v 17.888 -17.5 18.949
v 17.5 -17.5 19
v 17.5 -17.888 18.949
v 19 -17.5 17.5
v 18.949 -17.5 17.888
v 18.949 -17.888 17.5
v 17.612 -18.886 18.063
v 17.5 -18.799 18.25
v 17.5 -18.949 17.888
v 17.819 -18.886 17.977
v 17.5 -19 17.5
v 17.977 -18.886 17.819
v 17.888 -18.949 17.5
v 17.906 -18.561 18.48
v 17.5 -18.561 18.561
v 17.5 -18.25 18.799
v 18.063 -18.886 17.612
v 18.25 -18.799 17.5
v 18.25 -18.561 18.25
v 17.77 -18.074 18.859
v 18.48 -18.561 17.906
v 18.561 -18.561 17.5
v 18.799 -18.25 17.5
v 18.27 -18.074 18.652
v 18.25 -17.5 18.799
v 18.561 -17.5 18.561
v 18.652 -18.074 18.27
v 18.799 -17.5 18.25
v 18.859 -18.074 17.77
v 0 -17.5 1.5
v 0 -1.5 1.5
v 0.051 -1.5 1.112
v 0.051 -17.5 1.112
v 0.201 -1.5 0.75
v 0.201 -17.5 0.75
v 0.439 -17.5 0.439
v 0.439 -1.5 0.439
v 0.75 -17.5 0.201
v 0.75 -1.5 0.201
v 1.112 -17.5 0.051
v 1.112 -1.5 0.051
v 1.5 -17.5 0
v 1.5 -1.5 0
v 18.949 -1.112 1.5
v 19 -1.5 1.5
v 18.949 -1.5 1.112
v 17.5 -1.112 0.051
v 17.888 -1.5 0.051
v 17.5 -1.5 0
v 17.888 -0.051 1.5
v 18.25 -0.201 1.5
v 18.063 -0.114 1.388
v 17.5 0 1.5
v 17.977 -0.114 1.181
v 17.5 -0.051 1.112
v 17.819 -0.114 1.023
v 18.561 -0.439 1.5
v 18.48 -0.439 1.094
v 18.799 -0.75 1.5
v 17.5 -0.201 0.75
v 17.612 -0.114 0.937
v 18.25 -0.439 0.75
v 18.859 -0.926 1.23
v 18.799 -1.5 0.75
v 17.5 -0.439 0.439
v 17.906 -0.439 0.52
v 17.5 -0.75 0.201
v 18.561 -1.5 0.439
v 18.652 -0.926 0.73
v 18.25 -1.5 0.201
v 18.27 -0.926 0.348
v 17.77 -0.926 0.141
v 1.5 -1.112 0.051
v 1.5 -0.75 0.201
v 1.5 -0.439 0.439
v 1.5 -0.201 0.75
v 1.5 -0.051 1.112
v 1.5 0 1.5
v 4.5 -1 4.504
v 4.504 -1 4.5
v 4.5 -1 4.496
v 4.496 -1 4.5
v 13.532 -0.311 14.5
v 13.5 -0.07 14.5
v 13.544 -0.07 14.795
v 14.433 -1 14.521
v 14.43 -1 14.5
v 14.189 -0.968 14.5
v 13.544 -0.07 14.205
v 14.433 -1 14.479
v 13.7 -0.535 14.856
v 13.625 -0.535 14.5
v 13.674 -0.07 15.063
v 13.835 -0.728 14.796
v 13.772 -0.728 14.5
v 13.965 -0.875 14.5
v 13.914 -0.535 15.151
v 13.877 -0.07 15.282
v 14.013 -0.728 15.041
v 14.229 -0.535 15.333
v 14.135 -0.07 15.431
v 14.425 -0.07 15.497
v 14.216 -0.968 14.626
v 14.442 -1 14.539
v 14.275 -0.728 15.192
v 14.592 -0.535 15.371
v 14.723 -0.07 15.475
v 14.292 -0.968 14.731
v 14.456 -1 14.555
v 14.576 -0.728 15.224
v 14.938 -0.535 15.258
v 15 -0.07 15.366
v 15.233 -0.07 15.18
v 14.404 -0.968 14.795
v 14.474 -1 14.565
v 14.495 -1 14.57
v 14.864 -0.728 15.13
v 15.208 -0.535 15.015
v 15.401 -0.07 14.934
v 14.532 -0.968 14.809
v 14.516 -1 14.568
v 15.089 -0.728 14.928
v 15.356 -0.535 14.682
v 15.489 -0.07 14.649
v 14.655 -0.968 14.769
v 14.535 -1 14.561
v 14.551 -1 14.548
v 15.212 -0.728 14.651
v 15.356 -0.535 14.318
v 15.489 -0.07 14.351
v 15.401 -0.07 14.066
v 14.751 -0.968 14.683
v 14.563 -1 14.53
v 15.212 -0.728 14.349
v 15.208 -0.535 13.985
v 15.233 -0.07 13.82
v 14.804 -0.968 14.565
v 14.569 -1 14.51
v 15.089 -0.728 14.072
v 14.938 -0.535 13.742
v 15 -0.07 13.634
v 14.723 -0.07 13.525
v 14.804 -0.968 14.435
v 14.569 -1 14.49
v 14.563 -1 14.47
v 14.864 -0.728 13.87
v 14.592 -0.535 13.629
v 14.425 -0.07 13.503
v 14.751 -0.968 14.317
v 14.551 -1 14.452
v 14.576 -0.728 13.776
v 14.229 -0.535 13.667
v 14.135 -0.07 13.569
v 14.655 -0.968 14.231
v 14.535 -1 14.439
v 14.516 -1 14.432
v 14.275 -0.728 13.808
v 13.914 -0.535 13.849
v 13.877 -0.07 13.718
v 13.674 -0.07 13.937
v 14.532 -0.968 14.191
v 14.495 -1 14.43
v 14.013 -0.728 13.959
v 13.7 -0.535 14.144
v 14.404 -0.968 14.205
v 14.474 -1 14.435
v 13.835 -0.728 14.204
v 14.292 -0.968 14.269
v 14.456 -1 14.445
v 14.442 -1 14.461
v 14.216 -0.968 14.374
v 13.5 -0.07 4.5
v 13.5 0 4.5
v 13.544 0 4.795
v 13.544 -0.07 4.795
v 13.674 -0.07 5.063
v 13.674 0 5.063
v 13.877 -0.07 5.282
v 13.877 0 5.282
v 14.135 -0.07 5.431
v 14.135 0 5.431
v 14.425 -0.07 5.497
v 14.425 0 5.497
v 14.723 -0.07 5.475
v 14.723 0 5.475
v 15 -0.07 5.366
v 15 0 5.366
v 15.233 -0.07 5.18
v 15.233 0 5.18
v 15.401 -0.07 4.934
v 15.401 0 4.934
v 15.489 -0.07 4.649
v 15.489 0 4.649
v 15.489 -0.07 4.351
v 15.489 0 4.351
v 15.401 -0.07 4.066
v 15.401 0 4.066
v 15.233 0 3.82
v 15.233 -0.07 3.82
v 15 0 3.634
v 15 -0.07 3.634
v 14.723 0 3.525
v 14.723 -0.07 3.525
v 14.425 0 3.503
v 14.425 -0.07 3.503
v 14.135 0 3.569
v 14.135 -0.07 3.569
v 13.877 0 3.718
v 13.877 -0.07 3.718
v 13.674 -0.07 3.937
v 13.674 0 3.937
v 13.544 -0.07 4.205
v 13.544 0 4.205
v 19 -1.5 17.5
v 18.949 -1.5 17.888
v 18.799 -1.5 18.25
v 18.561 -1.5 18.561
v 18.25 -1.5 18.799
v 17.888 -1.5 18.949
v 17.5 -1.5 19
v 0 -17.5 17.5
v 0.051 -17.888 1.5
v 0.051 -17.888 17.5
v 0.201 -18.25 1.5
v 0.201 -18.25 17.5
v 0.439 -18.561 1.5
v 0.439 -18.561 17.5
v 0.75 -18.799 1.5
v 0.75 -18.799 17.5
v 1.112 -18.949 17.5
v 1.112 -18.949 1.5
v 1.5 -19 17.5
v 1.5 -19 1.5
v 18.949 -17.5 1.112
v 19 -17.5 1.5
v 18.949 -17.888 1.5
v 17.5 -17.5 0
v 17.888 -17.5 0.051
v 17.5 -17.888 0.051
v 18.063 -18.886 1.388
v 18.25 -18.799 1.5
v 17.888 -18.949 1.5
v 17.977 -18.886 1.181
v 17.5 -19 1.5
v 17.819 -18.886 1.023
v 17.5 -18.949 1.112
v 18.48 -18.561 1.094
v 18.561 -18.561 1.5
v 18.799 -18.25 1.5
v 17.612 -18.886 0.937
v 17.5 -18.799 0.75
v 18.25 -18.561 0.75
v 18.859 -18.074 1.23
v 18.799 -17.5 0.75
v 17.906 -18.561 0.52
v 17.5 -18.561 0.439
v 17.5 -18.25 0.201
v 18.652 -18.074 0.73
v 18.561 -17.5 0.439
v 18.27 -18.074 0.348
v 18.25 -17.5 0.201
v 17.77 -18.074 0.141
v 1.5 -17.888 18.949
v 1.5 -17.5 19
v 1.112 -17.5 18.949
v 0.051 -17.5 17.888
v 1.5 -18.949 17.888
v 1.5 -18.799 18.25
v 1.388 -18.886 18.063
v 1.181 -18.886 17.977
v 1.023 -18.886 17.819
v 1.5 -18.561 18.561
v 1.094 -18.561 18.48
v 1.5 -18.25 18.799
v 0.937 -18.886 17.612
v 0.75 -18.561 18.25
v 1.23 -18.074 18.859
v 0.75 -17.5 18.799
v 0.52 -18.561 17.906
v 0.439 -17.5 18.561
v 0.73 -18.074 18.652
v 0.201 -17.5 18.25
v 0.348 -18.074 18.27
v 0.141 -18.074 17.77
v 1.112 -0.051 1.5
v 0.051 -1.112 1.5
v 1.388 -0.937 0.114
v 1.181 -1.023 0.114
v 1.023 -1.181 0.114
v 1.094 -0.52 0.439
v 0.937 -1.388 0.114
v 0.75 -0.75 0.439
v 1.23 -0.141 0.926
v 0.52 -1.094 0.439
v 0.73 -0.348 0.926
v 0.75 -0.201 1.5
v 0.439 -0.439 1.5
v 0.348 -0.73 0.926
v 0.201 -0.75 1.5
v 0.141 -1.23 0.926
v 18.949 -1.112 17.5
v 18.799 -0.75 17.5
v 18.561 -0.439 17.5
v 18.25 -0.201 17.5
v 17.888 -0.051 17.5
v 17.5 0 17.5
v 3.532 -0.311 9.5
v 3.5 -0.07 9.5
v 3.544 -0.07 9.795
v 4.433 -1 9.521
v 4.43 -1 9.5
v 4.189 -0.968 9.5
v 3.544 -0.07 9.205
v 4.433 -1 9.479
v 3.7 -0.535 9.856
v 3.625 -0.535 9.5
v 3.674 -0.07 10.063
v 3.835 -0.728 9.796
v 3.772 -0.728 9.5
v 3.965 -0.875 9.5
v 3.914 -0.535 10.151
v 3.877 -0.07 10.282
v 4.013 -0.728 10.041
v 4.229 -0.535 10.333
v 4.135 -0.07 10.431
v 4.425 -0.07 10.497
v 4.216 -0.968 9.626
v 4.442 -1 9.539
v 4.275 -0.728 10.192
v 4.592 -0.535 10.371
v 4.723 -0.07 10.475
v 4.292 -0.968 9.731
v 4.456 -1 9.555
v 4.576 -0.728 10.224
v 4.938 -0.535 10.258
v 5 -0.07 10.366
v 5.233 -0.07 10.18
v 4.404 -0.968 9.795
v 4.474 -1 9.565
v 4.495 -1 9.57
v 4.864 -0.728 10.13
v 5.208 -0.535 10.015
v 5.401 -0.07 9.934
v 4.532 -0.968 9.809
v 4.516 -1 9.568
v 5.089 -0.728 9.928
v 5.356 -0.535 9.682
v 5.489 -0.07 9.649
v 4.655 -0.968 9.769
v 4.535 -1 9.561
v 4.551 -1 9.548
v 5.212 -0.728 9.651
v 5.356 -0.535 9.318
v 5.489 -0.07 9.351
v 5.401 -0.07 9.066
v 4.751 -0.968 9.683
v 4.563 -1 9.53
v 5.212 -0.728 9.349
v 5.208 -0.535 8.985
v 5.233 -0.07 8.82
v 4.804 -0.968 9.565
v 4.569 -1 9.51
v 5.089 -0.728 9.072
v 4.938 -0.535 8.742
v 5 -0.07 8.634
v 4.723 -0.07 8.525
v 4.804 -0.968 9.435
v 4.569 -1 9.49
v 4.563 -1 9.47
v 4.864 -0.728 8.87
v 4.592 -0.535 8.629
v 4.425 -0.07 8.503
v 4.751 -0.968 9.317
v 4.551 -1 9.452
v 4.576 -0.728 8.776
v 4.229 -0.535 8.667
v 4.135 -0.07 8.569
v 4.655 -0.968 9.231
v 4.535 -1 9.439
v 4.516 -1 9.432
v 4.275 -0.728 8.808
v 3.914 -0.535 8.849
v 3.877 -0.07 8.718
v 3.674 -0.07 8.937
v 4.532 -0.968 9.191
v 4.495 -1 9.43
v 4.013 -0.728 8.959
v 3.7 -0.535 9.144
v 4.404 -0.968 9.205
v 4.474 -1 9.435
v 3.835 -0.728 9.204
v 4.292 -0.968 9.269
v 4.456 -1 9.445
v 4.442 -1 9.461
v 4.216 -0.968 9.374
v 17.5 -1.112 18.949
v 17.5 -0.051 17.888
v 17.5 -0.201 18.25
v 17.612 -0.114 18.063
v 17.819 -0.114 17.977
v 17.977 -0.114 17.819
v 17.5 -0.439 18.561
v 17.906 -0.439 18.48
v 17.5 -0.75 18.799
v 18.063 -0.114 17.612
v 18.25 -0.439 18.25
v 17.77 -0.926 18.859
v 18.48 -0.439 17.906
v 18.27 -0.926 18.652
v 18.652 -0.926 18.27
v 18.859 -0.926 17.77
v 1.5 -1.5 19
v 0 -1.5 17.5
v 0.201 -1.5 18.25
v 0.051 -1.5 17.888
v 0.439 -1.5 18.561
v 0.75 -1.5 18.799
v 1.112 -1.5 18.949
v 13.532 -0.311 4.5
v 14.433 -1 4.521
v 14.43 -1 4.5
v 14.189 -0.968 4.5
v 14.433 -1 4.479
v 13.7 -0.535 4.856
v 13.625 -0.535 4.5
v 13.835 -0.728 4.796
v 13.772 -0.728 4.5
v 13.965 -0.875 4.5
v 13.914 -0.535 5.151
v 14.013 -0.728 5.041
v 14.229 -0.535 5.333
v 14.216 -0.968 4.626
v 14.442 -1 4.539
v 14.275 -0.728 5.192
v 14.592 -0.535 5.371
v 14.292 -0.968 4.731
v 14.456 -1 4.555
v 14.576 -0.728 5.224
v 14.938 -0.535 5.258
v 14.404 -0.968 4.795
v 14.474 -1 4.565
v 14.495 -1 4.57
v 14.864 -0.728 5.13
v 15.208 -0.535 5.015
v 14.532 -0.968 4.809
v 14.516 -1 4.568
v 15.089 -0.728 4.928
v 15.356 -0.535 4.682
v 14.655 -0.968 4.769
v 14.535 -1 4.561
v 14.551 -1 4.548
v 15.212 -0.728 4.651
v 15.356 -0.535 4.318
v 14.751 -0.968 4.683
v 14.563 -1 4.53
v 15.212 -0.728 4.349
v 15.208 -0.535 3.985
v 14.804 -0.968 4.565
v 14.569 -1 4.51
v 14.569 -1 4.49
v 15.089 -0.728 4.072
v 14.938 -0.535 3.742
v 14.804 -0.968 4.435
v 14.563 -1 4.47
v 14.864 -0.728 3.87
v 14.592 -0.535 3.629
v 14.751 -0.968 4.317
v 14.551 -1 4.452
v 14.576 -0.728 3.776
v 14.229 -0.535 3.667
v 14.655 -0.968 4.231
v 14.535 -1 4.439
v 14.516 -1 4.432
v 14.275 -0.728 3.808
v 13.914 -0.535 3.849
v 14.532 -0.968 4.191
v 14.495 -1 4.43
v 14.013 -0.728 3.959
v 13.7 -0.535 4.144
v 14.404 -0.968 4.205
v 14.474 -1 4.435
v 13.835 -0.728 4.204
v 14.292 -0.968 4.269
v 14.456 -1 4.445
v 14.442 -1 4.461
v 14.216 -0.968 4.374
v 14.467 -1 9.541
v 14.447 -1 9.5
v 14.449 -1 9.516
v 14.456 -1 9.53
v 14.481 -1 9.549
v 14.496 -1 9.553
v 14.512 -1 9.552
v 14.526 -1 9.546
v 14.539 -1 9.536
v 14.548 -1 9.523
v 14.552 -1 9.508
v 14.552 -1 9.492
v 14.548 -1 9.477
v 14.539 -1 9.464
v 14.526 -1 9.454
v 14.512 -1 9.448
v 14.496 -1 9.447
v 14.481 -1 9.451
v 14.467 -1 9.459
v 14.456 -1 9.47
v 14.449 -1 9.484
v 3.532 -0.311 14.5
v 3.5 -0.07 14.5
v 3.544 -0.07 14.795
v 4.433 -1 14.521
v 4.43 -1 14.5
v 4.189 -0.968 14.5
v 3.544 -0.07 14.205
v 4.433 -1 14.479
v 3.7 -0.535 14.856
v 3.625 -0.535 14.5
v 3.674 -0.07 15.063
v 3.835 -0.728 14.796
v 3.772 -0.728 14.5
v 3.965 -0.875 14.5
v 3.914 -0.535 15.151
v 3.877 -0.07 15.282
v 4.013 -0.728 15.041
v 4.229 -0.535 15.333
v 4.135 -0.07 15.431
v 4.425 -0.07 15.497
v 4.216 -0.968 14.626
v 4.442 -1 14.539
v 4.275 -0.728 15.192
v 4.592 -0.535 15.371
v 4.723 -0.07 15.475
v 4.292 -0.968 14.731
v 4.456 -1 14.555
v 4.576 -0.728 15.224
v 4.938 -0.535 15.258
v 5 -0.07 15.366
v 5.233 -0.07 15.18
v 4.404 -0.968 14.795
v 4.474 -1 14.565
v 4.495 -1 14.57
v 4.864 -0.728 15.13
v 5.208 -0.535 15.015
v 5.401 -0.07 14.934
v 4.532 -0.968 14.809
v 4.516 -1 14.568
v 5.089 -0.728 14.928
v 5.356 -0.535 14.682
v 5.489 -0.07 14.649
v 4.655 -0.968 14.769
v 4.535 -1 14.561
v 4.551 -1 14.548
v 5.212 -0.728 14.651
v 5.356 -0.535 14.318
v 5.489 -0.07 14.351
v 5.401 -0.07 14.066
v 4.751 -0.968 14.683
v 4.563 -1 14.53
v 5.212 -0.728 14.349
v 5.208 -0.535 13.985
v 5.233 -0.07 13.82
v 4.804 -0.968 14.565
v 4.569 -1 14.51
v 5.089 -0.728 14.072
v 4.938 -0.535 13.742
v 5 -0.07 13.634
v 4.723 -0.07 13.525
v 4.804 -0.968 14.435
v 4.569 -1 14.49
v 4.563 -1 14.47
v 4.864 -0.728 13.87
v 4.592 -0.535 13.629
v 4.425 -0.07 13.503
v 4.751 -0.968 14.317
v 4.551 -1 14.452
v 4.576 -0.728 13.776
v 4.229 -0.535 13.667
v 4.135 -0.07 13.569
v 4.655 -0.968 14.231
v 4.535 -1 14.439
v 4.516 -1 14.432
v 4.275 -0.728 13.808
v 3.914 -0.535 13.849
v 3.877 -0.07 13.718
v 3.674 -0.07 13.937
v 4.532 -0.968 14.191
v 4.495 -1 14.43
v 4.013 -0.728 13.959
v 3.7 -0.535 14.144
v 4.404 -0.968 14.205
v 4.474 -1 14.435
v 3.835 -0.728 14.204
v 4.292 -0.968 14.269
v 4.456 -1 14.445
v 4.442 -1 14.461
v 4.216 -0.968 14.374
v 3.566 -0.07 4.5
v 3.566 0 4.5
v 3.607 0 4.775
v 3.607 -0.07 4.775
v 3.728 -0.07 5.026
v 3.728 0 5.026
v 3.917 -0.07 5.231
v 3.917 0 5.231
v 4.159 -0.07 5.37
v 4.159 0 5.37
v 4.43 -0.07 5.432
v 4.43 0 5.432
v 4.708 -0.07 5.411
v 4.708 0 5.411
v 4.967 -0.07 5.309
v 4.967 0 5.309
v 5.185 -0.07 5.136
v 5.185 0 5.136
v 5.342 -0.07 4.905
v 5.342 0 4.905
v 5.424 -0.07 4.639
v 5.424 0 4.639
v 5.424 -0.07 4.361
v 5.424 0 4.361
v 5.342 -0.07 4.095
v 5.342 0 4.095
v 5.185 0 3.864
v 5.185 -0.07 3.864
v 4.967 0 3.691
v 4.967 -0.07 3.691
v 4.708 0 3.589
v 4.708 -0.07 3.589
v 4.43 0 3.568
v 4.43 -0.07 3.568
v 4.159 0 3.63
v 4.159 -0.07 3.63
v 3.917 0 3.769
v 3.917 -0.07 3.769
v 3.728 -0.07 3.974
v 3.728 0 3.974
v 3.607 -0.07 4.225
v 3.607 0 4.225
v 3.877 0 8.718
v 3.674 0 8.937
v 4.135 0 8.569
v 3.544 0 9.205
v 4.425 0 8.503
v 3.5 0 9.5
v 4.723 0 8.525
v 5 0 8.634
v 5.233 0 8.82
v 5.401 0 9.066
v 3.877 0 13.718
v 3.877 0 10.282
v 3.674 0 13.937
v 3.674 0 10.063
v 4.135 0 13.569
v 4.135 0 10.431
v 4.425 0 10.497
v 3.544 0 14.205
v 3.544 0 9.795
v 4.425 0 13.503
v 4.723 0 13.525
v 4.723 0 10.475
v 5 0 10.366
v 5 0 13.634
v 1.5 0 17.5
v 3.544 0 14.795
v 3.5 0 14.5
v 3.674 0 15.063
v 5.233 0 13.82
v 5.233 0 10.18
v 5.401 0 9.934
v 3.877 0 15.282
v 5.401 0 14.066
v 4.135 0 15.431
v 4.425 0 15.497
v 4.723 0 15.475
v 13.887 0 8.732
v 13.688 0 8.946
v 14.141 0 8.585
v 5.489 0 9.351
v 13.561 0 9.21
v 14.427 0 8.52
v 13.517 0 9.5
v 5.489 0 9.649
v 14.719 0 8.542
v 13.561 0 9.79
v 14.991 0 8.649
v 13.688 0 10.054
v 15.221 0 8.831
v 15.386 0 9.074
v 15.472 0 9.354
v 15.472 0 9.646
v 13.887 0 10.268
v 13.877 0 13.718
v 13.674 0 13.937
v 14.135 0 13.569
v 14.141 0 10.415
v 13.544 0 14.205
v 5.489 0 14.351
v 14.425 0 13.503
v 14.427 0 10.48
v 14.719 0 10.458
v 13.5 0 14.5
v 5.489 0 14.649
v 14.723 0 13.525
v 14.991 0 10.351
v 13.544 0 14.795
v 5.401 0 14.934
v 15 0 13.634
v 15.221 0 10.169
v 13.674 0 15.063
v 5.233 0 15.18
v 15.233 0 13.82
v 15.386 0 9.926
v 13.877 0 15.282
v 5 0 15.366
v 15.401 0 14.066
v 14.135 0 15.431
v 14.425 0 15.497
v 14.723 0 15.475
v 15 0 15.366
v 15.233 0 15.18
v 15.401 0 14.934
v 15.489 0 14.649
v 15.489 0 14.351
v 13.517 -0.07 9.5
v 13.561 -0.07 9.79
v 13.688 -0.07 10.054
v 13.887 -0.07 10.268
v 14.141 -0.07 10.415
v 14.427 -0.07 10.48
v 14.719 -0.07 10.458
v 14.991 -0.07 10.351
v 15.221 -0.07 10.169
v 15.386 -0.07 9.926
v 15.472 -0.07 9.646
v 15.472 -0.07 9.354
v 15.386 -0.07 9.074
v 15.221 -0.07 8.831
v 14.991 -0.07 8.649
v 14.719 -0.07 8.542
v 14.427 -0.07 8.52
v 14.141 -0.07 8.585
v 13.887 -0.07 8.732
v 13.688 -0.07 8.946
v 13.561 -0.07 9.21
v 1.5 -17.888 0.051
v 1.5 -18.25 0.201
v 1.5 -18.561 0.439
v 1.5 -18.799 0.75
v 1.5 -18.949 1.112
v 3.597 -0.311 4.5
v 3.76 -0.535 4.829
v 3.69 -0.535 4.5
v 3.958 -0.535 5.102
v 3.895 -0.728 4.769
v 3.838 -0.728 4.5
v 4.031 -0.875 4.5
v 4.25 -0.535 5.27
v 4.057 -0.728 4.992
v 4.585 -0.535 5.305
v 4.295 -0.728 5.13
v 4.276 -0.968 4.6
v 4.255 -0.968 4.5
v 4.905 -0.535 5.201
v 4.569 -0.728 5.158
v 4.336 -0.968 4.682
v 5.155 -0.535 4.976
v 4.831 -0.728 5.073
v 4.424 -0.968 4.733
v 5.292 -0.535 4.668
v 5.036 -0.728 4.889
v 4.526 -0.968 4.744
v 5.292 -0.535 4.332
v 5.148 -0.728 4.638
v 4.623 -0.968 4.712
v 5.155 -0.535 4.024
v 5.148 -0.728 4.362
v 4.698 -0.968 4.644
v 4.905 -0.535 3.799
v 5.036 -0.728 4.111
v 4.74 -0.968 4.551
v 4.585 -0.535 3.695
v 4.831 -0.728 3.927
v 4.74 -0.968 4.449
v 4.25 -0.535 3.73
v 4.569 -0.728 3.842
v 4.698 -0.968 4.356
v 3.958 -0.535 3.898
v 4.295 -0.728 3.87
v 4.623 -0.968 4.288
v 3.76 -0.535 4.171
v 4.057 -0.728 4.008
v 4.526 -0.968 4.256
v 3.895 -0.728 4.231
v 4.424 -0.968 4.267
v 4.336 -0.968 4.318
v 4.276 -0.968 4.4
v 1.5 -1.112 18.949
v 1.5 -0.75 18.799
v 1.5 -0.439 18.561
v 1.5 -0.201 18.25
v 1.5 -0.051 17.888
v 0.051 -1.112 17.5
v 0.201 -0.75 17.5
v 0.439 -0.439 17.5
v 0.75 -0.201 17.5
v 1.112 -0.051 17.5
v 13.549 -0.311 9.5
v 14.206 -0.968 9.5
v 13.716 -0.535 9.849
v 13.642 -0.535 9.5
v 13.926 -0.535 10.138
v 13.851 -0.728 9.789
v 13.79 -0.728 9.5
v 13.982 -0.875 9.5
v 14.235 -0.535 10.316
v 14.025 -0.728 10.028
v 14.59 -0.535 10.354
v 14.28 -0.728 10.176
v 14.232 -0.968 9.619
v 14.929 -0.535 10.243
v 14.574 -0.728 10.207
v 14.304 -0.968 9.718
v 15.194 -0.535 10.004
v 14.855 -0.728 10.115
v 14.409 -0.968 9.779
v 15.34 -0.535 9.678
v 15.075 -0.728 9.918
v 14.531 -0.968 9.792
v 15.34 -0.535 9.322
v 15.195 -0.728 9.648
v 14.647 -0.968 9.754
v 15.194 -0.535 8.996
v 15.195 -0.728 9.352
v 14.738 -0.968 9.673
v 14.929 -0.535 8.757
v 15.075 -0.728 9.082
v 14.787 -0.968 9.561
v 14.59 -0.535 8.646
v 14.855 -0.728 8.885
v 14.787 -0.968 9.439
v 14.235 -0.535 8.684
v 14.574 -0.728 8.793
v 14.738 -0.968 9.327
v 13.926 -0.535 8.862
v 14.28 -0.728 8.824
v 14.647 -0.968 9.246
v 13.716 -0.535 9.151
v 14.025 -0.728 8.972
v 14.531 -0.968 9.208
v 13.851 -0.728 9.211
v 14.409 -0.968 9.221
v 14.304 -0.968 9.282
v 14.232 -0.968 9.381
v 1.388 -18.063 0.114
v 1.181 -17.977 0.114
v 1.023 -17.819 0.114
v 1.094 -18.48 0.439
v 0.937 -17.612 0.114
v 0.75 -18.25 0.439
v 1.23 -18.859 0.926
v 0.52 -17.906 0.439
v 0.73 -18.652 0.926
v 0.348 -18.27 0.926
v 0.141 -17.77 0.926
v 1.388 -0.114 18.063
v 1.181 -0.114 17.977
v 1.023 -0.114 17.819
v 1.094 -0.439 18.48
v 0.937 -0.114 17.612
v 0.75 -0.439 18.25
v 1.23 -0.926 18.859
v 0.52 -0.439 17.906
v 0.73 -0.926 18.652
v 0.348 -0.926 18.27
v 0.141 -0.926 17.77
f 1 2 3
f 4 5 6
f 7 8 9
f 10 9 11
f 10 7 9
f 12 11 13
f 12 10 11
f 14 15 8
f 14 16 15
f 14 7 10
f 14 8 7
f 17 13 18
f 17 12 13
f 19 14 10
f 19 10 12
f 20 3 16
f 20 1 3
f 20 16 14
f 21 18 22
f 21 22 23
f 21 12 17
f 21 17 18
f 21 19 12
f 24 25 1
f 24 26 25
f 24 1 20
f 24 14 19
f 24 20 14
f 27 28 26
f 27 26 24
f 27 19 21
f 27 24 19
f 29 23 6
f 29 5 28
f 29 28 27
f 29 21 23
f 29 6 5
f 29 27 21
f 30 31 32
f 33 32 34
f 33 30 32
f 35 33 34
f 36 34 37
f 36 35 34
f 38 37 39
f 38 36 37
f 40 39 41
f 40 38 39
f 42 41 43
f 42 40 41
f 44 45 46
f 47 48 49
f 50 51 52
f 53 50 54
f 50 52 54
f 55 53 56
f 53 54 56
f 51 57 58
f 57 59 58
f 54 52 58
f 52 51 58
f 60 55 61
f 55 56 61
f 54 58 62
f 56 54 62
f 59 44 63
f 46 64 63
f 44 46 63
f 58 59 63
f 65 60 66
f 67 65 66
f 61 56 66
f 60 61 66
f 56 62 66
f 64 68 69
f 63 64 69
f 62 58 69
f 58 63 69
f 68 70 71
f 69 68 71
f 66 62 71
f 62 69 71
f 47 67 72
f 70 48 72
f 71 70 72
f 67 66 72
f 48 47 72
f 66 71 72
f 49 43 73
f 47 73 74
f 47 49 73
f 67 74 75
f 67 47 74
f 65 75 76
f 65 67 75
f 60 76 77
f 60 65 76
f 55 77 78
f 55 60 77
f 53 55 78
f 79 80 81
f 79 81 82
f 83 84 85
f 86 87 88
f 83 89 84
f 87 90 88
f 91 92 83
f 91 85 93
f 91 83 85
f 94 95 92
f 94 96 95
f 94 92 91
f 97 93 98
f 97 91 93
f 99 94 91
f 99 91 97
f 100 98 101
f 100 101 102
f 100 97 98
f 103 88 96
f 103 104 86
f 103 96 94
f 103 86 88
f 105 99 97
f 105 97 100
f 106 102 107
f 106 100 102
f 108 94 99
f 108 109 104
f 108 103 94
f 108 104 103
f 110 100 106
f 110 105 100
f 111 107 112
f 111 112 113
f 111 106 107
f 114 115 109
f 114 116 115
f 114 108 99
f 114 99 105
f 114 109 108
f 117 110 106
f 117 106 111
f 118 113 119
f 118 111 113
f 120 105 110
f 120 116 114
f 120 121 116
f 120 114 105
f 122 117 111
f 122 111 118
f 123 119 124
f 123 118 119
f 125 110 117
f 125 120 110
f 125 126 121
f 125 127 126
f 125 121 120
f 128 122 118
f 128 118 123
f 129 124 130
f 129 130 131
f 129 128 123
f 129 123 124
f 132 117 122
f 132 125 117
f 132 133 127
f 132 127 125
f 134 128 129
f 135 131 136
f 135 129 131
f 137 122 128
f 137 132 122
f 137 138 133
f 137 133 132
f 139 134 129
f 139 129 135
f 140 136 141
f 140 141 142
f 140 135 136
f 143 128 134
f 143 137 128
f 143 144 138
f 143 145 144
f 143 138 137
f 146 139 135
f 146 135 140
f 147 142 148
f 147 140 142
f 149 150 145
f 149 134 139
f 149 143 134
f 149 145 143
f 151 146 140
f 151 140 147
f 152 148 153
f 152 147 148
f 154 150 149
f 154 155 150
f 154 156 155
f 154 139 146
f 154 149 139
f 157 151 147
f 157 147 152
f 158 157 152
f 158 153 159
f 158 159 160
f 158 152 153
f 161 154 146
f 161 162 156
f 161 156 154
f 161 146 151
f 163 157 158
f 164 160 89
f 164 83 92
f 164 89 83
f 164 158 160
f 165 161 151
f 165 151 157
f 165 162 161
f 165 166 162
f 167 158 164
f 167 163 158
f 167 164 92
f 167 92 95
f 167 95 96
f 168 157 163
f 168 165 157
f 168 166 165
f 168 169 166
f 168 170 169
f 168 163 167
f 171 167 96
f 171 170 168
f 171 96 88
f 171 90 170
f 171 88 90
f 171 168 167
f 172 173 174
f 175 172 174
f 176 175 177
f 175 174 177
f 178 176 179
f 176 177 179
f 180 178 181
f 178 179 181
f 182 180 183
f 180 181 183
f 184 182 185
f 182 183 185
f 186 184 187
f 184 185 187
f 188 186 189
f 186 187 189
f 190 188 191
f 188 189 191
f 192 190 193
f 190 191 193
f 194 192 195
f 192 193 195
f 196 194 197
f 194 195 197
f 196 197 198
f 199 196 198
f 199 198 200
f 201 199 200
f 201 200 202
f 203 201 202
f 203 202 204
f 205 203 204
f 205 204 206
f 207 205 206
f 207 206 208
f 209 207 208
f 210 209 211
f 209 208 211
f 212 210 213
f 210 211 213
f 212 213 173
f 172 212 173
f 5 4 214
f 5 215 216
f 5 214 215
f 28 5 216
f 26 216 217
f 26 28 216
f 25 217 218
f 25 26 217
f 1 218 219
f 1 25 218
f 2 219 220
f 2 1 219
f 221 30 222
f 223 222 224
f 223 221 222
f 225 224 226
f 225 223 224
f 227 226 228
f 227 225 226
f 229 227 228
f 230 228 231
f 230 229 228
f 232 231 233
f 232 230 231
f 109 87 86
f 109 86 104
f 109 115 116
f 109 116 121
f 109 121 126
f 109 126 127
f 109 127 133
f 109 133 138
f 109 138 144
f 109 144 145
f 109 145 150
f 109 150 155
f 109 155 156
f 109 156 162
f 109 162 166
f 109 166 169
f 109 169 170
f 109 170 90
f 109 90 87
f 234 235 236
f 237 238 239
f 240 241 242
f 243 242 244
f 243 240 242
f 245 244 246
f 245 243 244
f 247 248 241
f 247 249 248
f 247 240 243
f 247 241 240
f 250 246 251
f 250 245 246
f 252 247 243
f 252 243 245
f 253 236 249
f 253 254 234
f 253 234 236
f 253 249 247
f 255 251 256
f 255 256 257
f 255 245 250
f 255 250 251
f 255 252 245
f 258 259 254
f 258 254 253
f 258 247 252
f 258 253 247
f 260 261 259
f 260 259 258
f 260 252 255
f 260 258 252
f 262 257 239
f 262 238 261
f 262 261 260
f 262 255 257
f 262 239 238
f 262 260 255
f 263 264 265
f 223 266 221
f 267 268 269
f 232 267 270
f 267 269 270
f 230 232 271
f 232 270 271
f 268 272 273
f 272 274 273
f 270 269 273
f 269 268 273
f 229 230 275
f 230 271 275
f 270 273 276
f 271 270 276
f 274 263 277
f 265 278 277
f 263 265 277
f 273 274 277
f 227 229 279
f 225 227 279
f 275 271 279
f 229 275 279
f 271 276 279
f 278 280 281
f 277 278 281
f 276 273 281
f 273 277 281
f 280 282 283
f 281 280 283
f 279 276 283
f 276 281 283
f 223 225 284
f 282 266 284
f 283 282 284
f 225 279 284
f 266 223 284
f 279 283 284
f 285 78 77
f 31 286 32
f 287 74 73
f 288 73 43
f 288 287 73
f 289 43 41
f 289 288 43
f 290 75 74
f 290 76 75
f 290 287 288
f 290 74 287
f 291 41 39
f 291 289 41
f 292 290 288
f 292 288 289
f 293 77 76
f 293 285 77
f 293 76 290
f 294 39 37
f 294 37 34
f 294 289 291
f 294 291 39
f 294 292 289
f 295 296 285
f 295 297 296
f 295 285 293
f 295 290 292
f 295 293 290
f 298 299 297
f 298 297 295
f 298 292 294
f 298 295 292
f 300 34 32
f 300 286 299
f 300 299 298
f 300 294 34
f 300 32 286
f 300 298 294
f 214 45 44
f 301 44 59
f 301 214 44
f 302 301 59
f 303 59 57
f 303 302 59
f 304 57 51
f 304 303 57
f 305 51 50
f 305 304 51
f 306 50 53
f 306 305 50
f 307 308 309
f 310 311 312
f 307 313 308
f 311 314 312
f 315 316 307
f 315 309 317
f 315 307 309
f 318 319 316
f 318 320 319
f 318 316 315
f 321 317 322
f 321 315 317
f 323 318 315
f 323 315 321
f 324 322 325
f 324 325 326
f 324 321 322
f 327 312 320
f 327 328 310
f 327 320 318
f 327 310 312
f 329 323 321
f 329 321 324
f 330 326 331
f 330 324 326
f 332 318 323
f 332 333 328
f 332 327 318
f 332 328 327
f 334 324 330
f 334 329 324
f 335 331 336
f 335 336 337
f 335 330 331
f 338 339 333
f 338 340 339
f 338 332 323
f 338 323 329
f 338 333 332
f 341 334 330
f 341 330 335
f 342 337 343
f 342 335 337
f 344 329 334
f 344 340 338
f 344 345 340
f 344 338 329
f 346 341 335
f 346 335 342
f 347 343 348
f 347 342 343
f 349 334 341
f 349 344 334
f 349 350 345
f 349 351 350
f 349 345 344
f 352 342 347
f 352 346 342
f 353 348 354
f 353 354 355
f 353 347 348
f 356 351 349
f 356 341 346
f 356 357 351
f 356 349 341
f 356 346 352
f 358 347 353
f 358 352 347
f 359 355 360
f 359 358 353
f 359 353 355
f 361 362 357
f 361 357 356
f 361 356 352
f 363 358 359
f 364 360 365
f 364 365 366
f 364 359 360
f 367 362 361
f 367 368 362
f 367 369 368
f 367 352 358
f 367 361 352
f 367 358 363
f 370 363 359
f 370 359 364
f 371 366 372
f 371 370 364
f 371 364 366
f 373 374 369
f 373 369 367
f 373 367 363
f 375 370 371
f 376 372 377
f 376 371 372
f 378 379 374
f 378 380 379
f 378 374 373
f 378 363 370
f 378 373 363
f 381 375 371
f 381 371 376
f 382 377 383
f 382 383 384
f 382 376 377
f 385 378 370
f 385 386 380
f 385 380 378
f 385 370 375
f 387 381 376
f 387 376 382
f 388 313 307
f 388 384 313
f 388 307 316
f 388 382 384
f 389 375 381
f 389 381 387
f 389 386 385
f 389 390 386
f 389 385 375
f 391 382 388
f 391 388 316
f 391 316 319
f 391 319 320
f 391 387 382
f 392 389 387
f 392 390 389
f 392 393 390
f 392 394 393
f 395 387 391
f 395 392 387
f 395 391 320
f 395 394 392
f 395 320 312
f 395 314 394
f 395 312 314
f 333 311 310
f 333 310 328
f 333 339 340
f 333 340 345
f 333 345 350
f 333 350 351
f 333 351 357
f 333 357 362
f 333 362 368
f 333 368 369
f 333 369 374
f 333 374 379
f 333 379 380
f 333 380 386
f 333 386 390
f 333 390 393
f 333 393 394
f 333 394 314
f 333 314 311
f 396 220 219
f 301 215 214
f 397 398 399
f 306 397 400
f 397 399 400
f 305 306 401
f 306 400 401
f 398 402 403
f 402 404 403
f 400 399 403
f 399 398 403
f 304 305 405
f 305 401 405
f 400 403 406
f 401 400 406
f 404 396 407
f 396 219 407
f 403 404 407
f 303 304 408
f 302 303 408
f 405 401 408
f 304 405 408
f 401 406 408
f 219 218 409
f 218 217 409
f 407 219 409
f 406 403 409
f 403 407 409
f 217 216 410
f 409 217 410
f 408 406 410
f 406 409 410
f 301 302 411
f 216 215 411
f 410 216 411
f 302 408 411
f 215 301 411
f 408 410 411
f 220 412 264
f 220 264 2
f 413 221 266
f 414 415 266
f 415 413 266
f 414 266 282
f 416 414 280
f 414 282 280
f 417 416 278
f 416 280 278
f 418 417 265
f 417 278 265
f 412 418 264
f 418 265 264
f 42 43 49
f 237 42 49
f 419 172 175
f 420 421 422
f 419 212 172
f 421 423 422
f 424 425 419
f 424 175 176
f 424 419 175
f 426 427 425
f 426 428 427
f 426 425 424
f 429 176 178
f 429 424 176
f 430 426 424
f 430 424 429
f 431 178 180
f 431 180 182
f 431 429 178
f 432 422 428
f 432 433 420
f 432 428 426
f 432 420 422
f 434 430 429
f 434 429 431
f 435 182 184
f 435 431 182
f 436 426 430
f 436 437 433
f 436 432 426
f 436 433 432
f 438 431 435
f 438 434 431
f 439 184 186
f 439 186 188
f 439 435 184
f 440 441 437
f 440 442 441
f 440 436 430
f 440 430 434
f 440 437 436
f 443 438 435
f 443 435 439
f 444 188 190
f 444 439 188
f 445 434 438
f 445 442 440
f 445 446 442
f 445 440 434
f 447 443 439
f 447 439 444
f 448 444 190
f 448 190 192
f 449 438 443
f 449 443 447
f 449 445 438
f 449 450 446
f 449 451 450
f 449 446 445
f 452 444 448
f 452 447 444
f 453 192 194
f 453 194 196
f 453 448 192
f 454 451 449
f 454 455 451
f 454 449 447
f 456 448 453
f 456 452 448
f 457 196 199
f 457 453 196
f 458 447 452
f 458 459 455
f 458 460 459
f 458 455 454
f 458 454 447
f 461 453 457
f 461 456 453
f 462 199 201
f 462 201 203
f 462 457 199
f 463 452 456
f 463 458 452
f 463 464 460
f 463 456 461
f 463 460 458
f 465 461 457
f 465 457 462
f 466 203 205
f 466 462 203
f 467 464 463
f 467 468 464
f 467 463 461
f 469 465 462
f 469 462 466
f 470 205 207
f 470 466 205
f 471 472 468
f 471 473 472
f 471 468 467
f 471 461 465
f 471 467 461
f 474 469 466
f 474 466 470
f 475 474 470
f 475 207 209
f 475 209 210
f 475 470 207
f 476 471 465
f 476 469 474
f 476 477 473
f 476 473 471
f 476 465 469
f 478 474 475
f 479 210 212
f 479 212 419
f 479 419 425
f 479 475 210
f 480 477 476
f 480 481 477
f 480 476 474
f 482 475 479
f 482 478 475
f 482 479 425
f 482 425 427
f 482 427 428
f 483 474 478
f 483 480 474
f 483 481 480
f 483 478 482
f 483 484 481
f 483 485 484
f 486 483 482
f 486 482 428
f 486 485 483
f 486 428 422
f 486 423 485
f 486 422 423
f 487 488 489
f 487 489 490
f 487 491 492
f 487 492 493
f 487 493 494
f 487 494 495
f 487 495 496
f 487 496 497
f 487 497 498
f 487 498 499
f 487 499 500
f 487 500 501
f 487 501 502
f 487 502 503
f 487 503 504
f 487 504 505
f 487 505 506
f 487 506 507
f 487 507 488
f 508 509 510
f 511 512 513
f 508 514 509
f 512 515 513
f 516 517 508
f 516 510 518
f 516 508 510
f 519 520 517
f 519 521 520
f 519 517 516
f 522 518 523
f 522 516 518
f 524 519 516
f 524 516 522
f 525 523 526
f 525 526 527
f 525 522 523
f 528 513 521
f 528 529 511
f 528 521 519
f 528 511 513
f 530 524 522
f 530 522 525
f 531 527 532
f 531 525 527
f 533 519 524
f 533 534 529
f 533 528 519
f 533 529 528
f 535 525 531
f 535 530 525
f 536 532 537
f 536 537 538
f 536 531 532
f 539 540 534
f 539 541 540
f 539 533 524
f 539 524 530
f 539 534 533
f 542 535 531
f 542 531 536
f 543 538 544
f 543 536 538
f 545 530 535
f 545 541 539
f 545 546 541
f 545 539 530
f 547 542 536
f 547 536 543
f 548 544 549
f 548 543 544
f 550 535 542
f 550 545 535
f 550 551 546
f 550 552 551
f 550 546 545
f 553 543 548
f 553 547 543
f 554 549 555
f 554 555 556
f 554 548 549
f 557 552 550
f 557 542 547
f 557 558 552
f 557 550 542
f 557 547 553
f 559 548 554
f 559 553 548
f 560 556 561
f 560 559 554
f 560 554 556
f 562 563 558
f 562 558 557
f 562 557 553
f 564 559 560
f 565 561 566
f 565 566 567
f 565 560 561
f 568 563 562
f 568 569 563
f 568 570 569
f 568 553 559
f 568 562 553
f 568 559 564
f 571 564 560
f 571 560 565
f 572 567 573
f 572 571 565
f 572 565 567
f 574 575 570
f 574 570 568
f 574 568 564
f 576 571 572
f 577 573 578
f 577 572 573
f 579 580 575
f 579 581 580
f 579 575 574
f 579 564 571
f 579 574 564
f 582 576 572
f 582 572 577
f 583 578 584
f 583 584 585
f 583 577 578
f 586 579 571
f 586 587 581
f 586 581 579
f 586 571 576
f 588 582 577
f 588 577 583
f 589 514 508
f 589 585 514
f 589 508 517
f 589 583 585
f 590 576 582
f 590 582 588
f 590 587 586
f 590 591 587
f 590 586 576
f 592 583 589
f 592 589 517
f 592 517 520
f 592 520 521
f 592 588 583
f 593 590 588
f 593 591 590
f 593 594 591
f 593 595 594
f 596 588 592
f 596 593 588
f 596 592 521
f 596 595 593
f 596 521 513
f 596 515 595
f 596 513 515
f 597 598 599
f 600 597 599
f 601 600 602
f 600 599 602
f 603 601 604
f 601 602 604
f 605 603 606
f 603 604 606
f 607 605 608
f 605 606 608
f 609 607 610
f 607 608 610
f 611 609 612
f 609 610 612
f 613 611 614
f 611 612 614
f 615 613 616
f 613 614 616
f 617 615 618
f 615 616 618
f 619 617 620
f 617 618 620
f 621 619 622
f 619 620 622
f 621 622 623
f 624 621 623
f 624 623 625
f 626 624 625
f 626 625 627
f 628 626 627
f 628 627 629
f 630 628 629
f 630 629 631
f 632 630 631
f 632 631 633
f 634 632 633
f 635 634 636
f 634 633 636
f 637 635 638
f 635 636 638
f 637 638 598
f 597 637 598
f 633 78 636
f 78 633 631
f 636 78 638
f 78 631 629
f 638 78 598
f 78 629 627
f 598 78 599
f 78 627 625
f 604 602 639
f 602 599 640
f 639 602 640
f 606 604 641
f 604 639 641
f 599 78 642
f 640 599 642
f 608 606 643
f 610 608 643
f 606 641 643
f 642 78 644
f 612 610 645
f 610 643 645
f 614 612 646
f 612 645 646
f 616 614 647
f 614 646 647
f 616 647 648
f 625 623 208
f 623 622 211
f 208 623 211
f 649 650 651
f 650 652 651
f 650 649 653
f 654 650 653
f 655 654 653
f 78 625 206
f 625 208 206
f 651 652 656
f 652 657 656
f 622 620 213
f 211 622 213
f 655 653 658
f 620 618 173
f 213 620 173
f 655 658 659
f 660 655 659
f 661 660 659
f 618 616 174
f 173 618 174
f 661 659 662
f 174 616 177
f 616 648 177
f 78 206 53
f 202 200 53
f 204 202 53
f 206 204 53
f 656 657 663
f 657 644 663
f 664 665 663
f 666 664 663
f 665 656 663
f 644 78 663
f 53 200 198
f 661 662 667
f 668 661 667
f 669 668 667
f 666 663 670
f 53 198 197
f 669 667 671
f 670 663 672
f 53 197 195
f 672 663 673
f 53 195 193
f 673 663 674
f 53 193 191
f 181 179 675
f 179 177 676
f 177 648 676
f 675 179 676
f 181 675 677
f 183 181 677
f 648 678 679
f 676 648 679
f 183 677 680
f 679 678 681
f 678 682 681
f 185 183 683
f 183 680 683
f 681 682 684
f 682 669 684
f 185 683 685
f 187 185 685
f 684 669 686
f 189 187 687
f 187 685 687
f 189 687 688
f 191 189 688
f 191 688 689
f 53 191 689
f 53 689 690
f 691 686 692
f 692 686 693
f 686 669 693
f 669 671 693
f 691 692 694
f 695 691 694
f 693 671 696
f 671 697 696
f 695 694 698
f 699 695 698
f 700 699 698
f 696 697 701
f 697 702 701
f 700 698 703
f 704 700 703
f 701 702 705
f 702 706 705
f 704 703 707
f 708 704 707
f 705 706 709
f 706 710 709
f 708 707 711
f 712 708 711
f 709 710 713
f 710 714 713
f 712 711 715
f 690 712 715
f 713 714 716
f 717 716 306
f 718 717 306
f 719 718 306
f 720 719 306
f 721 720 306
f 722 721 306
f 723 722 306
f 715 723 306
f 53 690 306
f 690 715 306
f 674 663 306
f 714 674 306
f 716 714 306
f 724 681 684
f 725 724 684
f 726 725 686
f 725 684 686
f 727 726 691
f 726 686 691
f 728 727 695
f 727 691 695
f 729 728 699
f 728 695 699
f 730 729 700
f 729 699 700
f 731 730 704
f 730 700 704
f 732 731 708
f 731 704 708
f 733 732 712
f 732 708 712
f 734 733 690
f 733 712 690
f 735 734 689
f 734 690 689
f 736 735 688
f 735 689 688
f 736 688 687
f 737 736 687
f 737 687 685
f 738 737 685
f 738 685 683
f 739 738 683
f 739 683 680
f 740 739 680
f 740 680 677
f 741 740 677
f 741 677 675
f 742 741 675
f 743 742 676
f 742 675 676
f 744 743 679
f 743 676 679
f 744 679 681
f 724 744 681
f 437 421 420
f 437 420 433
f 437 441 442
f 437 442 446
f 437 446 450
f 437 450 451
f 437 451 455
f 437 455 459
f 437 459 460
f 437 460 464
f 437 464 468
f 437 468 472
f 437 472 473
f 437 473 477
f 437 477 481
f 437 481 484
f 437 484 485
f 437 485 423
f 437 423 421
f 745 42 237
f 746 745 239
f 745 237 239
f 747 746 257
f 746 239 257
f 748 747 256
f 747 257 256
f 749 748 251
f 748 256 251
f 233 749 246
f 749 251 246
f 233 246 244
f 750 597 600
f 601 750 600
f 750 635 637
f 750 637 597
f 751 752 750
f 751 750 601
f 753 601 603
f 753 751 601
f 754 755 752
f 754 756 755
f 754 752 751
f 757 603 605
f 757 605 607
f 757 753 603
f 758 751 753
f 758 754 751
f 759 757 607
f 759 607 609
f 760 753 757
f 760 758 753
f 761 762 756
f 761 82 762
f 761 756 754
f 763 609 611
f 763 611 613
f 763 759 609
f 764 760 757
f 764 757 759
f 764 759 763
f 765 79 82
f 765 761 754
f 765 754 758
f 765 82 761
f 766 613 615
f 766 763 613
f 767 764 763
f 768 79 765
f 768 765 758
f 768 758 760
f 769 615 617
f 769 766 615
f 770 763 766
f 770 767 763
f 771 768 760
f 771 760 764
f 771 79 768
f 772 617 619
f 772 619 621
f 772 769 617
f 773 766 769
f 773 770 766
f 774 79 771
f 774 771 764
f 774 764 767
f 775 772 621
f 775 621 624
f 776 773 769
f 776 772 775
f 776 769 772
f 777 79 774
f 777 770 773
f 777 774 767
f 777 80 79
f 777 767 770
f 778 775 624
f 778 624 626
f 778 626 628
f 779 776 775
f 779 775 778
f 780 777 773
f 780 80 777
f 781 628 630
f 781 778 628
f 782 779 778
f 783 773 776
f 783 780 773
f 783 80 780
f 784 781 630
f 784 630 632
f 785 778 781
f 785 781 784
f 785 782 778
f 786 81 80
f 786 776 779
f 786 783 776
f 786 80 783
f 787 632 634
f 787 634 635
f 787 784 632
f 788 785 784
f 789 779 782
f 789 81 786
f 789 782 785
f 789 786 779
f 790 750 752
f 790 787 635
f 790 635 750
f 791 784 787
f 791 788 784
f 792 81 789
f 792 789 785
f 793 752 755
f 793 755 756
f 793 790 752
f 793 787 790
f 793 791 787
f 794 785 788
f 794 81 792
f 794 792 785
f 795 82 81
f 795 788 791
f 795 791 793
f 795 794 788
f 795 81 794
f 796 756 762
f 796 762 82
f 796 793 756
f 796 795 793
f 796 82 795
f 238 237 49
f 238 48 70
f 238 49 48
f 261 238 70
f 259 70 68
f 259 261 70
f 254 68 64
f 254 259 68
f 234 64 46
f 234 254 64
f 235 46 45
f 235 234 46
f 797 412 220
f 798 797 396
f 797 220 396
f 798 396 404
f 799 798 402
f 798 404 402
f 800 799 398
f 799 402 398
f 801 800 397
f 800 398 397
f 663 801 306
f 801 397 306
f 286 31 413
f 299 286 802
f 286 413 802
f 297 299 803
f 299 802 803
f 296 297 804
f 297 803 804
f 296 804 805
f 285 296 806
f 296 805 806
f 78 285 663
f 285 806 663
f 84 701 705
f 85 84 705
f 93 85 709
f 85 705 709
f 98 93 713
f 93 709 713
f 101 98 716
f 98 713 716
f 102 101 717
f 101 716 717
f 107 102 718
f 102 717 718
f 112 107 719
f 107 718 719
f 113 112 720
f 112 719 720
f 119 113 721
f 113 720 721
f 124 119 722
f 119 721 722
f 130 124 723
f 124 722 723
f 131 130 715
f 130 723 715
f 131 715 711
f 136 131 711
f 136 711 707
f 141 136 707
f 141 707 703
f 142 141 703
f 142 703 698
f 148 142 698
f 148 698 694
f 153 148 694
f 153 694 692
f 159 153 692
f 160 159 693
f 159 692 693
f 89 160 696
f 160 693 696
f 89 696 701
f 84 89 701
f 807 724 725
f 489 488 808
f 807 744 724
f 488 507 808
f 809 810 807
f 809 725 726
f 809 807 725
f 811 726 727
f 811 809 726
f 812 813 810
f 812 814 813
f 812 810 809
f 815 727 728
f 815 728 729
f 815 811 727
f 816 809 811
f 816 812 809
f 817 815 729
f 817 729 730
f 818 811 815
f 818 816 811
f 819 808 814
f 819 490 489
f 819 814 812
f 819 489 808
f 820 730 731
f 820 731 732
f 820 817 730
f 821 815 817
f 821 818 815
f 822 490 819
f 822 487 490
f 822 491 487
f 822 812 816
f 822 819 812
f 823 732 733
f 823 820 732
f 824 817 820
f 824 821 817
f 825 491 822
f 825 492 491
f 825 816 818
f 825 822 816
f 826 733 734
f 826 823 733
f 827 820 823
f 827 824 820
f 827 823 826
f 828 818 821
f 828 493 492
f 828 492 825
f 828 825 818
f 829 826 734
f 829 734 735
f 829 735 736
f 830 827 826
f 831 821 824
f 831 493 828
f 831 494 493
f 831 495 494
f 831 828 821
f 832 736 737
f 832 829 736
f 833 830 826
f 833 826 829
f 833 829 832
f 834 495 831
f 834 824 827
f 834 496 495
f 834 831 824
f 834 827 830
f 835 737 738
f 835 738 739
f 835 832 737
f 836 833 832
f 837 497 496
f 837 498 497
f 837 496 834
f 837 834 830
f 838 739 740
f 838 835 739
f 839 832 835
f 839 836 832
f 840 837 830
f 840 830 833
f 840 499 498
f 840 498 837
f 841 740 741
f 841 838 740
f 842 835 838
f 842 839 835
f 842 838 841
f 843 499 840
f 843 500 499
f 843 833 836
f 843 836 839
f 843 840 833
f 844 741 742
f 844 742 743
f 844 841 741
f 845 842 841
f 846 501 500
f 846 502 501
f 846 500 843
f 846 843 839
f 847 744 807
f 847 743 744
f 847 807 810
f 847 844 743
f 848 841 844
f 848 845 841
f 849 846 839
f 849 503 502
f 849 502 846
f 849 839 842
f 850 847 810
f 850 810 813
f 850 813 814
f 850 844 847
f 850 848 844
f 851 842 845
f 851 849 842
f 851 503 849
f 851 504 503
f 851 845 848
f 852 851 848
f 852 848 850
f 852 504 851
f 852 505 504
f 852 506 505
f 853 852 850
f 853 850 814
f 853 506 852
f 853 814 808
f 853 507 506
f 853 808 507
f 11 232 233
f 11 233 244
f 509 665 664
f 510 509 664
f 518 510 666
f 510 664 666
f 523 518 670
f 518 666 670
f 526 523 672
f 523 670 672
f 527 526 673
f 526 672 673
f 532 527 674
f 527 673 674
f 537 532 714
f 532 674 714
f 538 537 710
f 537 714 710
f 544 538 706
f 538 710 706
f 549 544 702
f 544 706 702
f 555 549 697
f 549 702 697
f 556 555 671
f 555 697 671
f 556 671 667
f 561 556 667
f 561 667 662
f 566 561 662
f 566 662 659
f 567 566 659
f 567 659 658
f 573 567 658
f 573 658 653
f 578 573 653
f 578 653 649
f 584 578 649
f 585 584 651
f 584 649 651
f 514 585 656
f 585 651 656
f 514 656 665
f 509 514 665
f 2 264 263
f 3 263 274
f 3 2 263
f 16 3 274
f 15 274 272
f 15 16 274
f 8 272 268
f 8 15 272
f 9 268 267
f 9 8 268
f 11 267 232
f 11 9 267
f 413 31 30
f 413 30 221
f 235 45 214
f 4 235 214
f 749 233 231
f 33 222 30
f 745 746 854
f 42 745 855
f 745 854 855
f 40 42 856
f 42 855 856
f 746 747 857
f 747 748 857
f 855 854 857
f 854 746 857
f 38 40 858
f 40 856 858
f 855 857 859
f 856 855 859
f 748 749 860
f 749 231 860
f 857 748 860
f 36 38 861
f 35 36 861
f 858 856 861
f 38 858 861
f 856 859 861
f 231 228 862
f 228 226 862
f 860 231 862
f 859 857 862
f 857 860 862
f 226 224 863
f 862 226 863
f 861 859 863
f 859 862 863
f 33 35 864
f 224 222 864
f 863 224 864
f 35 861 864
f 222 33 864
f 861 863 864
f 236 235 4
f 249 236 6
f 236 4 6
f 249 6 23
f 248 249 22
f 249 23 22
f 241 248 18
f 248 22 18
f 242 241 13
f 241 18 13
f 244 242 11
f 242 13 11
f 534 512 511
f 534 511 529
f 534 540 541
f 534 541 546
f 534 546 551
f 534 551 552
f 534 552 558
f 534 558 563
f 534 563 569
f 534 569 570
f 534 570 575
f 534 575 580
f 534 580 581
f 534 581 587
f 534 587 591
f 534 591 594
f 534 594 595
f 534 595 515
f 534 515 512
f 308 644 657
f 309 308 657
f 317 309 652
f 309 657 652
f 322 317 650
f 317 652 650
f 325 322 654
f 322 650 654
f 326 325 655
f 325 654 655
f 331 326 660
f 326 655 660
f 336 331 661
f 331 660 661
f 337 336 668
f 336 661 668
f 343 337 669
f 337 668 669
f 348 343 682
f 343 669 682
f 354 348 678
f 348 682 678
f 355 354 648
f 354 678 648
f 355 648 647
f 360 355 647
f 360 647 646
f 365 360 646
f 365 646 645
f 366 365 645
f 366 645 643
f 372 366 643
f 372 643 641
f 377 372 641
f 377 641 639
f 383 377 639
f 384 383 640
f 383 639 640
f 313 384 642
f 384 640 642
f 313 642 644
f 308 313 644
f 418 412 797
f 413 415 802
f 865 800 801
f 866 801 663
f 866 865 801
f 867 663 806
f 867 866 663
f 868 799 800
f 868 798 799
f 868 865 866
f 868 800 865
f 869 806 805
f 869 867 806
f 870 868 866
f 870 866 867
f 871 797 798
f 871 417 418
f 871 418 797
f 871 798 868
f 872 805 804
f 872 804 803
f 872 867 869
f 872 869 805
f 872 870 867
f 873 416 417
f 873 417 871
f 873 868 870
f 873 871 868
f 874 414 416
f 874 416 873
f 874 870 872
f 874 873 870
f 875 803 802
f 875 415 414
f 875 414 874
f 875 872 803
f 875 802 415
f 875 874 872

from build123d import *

# Parameters (mm, degrees)
F0_W     = 19
F0_H     = 19
F1_DEPTH = 19
F2_R     = 1.5
F3_R     = 0.982885
F3_R_2   = 1
F3_R_3   = 0.934446
F4_DEPTH = 1
F5_R     = 0.93


with BuildPart() as f1:
    # F0 (on Front) → F1 (new body)
    with BuildSketch(Plane.XZ):
        with Locations((9.5, 9.5)):
            Rectangle(F0_W, F0_H)
    extrude(amount=F1_DEPTH)

    # F2
    f2_edges = [f1.edges().sort_by_distance(p)[0] for p in [
        (19, -9.5, 19),
        (0, -9.5, 19),
        (9.5, 0, 19),
        (9.5, -19, 19),
        (19, -9.5, 0),
        (19, 0, 9.5),
        (19, -19, 9.5),
        (0, 0, 9.5),
        (9.5, 0, 0),
        (0, -19, 9.5),
        (9.5, -19, 0),
        (0, -9.5, 0),
    ]]
    fillet(f2_edges, radius=F2_R)

    # F3 (on face) → F4 (cut)
    with BuildSketch(Plane(origin=(0, 0, 0), x_dir=(-1, 0, 0), z_dir=(0, 1, 0))):
        with Locations((-14.5, 9.5)):
            Circle(F3_R)
        with Locations((-14.5, 14.5)):
            Circle(F3_R_2)
        with Locations((-14.5, 4.5)):
            Circle(F3_R_2)
        with Locations((-4.5, 4.5)):
            Circle(F3_R_3)
        with Locations((-4.5, 9.5)):
            Circle(F3_R_2)
        with Locations((-4.5, 14.5)):
            Circle(F3_R_2)
    extrude(amount=-F4_DEPTH, mode=Mode.SUBTRACT)

    # F5
    f5_edges = [f1.edges().sort_by_distance(p)[0] for p in [
        (15.5, -1, 14.5),
        (15.482885, -1, 9.5),
        (15.5, -1, 4.5),
        (5.434446, -1, 4.5),
        (5.5, -1, 9.5),
        (5.5, -1, 14.5),
    ]]
    fillet(f5_edges, radius=F5_R)


solid = f1.part
